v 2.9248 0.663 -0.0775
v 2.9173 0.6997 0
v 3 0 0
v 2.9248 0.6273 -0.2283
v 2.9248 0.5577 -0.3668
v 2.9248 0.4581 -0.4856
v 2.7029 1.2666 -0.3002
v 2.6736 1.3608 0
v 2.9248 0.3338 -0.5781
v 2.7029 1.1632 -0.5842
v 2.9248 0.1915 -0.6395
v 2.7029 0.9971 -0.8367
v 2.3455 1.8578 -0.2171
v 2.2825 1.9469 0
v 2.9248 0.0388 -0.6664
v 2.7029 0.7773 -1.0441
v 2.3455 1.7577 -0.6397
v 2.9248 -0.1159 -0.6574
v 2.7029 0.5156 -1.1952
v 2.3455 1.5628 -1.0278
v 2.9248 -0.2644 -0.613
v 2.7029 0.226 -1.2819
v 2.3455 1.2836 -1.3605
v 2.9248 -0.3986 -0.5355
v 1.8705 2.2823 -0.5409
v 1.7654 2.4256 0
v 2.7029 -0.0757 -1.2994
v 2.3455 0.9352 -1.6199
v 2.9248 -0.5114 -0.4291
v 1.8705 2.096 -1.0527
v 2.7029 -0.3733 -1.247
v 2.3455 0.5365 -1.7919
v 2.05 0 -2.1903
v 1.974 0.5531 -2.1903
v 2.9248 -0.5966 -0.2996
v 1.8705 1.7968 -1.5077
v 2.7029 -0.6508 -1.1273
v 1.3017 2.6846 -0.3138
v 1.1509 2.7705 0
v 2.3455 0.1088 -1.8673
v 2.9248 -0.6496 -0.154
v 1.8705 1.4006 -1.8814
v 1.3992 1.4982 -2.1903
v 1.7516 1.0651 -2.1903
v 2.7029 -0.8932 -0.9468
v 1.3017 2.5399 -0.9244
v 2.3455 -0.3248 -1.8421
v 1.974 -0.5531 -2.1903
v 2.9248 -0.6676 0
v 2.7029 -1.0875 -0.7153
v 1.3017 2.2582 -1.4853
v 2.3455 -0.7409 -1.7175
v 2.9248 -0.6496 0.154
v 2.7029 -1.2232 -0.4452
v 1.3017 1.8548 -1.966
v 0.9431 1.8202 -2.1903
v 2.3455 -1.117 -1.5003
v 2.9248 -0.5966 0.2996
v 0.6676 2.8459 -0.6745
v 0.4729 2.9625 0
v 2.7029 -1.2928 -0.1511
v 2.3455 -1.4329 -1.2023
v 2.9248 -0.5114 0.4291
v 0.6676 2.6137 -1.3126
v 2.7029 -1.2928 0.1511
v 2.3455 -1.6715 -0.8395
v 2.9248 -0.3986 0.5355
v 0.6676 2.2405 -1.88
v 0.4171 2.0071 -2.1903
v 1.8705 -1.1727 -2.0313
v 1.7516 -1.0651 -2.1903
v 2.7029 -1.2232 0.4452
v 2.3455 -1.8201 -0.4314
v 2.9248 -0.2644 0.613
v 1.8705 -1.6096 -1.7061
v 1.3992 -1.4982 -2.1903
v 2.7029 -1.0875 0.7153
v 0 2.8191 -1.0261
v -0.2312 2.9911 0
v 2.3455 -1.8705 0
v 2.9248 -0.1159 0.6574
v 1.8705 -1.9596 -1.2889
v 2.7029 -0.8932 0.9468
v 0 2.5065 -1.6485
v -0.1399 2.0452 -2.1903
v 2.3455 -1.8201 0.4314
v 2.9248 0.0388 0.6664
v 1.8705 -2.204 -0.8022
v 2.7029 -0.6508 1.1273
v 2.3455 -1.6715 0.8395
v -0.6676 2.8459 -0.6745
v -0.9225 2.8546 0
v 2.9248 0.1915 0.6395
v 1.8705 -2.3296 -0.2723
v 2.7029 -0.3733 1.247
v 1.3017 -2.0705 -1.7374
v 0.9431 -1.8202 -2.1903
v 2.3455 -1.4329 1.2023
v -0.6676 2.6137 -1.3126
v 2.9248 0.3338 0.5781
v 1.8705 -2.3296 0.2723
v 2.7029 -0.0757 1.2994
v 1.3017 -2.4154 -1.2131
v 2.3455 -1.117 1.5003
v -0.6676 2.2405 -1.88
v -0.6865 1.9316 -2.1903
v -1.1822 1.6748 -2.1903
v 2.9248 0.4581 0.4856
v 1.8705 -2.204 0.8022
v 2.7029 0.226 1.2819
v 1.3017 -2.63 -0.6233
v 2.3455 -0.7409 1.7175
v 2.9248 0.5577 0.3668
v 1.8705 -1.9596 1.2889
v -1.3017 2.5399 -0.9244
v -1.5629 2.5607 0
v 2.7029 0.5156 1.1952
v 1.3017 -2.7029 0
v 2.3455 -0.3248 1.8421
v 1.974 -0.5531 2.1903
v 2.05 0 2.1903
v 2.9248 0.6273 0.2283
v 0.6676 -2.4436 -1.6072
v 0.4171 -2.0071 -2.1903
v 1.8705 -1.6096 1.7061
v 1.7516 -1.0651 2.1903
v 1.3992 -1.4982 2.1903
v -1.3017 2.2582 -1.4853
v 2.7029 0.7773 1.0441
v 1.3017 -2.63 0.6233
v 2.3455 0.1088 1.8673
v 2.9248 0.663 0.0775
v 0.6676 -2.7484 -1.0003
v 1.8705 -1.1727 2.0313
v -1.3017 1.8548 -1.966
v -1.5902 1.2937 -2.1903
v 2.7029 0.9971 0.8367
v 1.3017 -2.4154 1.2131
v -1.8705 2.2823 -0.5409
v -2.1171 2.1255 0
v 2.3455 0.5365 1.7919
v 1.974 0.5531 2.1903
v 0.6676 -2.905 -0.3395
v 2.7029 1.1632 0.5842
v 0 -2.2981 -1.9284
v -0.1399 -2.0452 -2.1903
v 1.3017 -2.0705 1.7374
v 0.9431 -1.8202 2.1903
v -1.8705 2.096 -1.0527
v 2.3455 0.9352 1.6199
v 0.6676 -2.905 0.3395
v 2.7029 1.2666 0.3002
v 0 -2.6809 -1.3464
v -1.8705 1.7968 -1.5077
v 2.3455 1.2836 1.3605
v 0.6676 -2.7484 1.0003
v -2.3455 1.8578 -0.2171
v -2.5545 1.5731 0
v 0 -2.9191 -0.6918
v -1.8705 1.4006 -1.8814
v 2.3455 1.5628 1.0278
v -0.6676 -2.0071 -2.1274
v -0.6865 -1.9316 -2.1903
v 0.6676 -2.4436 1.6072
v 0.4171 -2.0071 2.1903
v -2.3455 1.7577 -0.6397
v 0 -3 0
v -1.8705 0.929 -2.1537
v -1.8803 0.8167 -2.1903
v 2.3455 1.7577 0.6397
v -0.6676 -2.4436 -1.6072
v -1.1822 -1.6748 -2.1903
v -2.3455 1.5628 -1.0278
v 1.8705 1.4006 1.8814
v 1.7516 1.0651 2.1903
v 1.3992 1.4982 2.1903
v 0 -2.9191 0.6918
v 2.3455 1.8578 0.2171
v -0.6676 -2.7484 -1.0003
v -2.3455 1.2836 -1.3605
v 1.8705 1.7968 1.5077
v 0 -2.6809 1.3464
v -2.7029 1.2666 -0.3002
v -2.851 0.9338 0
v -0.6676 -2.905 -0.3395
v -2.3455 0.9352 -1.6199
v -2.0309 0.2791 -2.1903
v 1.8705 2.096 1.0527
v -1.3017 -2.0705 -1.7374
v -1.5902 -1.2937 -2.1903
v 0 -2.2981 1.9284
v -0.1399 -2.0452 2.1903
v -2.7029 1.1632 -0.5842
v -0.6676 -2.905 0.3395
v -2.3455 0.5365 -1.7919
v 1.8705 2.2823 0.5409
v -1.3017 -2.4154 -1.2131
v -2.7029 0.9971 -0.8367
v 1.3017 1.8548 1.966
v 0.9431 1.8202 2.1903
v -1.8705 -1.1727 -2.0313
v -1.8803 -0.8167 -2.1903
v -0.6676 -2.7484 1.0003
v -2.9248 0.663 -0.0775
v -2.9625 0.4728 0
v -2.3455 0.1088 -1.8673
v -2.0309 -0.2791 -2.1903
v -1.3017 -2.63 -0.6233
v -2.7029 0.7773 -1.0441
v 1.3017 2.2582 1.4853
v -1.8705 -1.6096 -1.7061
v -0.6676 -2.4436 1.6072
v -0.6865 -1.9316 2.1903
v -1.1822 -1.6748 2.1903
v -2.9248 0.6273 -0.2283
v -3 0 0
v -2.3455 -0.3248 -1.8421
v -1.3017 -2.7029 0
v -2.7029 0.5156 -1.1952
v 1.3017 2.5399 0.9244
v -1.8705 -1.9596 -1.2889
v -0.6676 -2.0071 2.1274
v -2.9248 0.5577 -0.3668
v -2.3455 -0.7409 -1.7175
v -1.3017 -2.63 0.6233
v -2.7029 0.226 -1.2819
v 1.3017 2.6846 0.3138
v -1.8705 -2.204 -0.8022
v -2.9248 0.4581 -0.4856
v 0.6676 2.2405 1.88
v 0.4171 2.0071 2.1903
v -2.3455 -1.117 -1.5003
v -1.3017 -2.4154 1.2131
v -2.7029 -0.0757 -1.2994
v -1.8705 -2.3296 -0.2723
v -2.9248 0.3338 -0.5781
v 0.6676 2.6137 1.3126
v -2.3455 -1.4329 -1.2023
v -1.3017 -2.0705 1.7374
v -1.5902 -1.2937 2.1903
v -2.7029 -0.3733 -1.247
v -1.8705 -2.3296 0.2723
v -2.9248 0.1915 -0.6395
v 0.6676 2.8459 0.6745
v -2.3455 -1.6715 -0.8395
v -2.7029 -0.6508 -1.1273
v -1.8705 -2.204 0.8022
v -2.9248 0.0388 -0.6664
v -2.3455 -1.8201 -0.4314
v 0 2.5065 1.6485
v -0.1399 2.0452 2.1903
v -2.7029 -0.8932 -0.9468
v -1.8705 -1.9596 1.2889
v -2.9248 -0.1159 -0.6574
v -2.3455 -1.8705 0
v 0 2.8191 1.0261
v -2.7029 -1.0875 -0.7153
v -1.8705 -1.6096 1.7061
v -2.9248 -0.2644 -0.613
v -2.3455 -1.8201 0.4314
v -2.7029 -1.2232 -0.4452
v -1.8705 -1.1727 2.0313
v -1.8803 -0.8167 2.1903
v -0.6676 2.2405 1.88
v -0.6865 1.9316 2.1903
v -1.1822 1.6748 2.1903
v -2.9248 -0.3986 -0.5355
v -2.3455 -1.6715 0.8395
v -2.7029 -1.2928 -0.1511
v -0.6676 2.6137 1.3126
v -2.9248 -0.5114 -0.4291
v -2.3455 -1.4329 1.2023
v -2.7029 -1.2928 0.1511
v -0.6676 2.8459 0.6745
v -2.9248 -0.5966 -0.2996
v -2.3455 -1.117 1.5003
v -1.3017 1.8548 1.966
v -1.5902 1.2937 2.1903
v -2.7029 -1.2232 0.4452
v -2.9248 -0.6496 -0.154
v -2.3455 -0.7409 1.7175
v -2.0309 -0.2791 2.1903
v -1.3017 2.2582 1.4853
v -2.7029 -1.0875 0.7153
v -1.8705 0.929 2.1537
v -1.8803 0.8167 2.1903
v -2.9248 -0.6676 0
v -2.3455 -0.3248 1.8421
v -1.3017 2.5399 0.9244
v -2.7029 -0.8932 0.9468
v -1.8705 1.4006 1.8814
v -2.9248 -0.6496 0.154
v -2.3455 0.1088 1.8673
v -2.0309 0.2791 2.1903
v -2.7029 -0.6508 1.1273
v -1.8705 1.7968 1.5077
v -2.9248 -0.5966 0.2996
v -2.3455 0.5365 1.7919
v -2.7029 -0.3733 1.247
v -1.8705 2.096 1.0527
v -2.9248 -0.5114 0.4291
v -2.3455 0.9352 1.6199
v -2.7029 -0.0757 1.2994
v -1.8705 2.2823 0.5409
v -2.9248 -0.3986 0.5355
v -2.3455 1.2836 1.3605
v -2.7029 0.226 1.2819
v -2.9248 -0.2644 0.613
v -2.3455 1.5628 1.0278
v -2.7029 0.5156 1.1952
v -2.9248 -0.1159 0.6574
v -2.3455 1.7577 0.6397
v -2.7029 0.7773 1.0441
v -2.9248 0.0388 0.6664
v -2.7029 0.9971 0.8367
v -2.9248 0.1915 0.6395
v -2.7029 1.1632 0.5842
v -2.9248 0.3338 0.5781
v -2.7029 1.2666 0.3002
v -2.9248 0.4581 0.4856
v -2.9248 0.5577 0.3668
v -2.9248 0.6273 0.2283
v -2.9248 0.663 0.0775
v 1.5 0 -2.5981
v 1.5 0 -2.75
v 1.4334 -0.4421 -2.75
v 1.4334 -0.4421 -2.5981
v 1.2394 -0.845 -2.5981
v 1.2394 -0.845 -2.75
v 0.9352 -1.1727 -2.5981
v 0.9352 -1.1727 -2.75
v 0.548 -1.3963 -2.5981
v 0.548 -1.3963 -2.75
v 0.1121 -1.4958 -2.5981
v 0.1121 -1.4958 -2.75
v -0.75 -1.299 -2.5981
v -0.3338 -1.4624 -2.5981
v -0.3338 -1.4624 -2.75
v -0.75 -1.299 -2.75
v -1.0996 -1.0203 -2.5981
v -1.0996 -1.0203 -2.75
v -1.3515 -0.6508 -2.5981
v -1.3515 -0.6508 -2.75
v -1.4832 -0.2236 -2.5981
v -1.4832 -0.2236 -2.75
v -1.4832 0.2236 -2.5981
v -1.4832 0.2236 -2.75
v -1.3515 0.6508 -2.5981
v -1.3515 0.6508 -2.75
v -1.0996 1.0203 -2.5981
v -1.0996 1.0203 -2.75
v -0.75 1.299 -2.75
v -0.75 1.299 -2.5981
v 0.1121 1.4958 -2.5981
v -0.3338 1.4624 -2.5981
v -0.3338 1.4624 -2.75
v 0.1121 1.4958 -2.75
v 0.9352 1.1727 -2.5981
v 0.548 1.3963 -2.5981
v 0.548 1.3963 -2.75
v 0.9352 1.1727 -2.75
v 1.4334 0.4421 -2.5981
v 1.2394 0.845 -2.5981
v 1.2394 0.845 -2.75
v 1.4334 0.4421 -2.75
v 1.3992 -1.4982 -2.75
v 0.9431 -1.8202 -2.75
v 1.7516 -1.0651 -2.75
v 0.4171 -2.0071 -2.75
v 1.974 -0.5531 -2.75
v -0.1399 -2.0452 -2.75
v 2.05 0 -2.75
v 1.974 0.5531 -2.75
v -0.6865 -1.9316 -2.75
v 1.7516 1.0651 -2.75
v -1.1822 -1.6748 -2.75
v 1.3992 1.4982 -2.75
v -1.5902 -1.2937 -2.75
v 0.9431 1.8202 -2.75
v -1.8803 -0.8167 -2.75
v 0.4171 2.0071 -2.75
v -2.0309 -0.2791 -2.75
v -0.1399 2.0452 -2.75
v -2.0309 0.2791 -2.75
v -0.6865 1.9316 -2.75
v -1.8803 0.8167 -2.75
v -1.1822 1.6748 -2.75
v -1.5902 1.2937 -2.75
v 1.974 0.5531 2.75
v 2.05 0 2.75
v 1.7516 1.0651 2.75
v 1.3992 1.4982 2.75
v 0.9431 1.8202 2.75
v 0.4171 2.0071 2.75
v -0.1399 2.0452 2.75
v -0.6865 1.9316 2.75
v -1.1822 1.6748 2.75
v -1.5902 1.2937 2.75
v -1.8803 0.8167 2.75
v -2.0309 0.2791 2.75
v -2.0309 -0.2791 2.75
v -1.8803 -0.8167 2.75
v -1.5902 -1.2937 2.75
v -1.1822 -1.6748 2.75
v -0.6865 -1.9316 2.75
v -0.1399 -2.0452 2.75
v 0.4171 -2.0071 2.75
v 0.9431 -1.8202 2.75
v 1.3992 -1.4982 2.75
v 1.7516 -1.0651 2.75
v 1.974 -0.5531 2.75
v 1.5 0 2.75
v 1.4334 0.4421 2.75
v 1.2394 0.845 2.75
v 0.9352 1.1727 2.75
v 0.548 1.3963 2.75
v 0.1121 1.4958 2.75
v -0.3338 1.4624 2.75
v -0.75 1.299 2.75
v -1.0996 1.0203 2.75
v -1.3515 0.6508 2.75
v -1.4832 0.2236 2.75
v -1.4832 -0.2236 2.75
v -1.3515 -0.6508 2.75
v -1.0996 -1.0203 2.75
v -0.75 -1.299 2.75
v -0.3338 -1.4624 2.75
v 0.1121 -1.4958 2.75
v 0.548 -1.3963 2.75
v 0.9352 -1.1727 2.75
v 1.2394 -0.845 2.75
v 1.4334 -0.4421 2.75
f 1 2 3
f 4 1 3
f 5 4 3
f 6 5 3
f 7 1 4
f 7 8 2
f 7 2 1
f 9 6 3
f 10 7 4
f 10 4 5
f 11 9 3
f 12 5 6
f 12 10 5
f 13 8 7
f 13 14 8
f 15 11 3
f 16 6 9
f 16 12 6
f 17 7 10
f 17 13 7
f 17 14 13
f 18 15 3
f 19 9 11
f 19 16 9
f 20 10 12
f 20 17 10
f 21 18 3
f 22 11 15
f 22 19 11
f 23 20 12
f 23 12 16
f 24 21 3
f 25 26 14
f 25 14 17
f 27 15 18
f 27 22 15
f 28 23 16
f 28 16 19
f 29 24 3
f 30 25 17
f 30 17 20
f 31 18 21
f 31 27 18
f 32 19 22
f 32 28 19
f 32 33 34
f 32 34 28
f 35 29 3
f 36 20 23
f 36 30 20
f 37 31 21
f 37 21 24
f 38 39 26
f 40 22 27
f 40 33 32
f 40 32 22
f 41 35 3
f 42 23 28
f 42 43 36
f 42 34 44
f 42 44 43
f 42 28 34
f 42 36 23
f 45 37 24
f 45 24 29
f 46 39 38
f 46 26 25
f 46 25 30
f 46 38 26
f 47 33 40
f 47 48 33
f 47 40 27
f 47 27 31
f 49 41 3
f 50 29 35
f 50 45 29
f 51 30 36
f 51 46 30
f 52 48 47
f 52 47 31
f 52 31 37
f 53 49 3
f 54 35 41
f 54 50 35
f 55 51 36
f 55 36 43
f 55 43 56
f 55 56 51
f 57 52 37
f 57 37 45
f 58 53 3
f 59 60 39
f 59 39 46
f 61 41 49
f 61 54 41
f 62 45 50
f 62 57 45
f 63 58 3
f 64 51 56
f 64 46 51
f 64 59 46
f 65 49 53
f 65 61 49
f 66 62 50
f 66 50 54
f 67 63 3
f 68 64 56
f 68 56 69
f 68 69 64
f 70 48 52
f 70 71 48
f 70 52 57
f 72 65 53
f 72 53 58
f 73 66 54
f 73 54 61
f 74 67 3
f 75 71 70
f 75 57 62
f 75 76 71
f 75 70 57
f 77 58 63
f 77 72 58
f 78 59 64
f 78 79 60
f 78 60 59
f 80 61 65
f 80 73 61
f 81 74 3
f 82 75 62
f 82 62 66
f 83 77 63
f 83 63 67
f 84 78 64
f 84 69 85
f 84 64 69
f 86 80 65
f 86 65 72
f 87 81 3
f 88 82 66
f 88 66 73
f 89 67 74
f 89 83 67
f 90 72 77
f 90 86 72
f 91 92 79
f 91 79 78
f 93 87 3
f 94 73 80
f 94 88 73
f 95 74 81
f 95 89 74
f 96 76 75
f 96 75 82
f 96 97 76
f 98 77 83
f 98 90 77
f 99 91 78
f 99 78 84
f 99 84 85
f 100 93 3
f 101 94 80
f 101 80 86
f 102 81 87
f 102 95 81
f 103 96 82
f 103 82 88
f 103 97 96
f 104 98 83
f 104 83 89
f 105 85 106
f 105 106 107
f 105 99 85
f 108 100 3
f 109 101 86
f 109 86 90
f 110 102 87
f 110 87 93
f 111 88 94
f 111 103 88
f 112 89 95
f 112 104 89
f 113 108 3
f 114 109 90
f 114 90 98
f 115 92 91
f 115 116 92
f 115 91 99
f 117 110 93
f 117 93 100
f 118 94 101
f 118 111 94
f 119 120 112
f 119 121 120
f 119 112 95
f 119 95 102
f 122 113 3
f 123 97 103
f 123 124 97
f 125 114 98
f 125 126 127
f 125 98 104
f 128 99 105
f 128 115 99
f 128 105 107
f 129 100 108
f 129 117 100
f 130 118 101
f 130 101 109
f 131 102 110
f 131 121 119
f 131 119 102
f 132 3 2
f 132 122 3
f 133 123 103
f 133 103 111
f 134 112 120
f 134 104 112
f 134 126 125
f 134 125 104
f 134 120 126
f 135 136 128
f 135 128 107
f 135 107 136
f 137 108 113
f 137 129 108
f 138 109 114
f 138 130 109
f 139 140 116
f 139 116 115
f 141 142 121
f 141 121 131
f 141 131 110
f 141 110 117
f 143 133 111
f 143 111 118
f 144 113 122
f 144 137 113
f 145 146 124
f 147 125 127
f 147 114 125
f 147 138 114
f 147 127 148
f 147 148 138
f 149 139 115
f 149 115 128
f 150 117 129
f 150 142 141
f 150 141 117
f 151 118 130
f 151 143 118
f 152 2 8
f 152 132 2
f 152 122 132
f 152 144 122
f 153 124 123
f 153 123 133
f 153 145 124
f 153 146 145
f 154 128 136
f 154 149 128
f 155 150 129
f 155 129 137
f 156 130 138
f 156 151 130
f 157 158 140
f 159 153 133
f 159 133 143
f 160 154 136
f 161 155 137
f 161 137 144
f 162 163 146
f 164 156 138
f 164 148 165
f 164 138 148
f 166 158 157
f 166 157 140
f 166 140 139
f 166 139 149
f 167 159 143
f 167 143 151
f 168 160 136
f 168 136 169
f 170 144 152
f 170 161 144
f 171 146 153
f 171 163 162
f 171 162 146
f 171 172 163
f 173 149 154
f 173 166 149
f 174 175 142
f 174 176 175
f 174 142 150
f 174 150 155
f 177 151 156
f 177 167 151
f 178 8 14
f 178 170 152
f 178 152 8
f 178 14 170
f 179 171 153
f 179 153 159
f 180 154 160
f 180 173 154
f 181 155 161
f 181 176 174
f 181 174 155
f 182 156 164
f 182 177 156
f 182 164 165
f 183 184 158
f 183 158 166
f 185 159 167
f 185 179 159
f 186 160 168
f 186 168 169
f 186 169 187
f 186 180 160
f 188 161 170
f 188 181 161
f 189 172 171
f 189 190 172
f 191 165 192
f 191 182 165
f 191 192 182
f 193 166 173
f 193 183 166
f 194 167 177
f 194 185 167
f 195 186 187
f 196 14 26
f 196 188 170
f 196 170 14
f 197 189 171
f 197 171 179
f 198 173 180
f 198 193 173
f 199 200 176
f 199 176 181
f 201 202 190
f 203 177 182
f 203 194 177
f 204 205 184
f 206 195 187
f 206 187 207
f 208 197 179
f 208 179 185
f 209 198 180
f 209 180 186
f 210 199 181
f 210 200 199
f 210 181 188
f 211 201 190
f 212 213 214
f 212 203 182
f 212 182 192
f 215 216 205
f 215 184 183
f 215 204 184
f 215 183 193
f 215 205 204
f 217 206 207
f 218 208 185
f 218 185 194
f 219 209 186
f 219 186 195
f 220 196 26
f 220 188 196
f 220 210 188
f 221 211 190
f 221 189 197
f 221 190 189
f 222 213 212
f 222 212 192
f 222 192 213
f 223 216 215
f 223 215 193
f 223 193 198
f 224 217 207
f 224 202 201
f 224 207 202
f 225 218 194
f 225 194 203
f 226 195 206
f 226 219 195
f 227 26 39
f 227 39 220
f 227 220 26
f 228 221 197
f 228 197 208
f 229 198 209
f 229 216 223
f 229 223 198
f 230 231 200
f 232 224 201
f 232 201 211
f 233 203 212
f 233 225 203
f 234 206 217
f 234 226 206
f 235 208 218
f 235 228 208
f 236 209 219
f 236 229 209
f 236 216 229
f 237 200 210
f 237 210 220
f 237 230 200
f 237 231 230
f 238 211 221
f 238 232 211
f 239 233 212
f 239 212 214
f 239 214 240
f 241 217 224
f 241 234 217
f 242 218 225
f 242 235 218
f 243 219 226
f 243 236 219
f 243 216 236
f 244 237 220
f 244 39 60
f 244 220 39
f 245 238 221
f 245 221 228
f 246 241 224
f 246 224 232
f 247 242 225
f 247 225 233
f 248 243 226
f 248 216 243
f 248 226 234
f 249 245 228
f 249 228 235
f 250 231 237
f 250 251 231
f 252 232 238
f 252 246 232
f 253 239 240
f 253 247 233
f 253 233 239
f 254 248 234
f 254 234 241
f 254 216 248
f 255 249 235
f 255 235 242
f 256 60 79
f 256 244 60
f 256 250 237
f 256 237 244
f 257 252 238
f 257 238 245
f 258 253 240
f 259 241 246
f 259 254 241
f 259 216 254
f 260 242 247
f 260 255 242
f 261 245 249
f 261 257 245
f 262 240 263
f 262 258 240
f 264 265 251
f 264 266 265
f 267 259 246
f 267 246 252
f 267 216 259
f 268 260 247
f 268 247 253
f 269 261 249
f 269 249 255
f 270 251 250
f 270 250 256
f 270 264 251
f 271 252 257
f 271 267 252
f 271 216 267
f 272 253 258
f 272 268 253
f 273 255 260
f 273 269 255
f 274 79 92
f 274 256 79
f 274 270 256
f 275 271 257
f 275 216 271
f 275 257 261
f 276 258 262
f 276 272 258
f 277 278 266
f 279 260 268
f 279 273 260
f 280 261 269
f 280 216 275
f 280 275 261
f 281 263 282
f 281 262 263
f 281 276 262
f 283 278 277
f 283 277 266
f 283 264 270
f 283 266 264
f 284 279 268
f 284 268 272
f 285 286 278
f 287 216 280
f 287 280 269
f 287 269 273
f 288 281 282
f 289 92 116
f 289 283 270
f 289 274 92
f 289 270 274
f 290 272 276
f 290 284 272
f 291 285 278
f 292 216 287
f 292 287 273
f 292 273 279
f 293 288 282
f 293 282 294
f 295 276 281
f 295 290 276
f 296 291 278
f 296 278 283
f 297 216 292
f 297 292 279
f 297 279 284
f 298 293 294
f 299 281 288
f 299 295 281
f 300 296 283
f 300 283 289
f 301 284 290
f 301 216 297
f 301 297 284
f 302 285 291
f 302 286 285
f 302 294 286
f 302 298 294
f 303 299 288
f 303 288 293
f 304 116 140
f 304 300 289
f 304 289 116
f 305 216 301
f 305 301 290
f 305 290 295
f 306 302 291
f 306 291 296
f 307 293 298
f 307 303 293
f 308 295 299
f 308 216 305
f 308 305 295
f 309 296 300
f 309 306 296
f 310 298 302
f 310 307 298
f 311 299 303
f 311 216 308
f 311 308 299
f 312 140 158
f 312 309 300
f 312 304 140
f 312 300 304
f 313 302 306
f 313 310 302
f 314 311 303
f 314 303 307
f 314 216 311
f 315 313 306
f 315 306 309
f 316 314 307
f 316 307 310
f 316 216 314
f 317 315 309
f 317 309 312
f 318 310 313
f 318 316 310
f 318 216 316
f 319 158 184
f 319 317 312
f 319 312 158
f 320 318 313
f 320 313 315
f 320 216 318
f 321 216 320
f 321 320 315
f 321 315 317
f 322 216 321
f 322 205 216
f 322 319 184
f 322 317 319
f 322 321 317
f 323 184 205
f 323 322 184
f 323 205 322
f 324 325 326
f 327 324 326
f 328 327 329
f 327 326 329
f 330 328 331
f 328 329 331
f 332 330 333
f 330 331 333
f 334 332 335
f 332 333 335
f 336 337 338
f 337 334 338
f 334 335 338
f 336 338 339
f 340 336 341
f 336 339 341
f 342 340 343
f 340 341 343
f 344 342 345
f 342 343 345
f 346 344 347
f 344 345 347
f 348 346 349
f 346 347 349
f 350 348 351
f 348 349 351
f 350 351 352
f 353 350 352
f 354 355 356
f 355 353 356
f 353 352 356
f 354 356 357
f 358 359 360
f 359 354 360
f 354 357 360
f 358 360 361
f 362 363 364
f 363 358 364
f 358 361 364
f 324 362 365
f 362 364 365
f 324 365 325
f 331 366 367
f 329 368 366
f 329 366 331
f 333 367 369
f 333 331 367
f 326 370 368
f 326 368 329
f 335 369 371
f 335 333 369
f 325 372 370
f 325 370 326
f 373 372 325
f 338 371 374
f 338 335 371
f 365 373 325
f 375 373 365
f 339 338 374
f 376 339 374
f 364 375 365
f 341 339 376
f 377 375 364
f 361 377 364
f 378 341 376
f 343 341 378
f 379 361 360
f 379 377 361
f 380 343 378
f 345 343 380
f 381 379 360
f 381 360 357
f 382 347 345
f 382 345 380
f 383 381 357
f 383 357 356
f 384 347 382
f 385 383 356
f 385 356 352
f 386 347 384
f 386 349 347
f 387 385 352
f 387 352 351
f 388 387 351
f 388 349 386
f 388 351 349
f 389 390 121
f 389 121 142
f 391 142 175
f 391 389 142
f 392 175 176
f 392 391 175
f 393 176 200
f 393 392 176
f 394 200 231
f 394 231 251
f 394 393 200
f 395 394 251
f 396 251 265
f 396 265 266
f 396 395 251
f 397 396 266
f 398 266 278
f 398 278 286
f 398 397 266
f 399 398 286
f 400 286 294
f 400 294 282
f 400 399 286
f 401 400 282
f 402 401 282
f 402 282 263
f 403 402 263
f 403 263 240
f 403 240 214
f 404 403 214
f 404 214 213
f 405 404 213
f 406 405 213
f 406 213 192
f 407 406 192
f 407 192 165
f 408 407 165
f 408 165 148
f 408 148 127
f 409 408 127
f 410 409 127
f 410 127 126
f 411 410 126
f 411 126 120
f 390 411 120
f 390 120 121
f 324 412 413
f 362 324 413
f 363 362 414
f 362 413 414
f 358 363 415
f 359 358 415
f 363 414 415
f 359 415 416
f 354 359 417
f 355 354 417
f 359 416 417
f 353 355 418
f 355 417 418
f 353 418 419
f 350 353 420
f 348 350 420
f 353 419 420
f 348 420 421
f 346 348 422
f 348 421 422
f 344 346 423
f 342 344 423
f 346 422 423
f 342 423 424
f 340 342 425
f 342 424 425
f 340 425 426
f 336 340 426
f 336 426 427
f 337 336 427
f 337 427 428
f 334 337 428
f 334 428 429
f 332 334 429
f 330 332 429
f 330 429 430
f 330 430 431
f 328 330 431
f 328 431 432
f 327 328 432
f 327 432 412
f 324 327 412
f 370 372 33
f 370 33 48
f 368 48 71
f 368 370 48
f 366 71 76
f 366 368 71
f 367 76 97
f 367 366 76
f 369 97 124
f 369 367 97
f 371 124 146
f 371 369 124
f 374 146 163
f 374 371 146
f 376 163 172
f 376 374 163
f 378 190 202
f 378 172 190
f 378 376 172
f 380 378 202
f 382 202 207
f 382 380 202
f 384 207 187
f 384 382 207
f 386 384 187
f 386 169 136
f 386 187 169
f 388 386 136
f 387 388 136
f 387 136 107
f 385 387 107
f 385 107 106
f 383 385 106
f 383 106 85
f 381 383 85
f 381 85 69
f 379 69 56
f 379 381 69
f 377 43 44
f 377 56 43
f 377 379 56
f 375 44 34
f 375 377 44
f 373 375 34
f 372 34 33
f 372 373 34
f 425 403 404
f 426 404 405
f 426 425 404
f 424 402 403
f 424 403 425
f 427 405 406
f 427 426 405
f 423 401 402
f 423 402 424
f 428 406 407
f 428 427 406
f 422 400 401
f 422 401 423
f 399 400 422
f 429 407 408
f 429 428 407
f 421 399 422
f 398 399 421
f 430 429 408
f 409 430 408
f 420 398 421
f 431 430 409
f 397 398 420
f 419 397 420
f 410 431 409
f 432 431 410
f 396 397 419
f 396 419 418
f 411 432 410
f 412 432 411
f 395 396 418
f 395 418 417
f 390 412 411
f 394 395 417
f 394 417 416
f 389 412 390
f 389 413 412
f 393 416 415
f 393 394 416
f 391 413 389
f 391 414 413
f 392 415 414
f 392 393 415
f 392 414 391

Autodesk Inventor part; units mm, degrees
ref_plane "YZ Plane" through (0, 0, 0) normal (1, 0, 0) x (0, 1, 0)
ref_plane "XZ Plane" through (0, 0, 0) normal (0, 1, 0) x (-1, 0, 0)
sketch "Sketch2" plane through (0, 0, 0) normal (0, 0, 1) x (1, 0, 0)
  line L0 (-4.2, 0) -> (4.2, 0) construction
  line L1 (0, -4.2) -> (0, 4.2) construction
  circle A0 centre (0, 0) radius 3
  line L2 (-3, 0) -> (3, 0)
  dimension "d0" = 6
revolve "Revolution1" add sketch "Sketch2" angle 360 about axis through (-10, 0, 0) along (1, 0, 0) picked at (0.7485, 0.6631) contours L2 A0
sketch "Sketch3" plane through (0, 0, 0) normal (0, 0, 1) x (1, 0, 0)
  circle A0 centre (0, 0) radius 1.5
  dimension "d2" = 3
extrude "Extrusion1" cut sketch "Sketch3" along normal through all both and the other way through all
ref_plane "Work Plane1" through (0, 0, 2.75) normal (0, 0, 1) x (1, 0, 0)
sketch "Sketch4" plane through (0, 0, 2.75) normal (0, 0, 1) x (1, 0, 0)
  circle A0 centre (0, 0) radius 1.5 construction
  circle A1 centre (0, 0) radius 1.5
  circle A2 centre (0, 0) radius 2.05
  dimension "d6" = 4.1
extrude "Extrusion2" add sketch "Sketch4" against normal up to surface
mirror "Mirror1" about plane through (0, 0, 0) normal (0, 0, 1) of "Extrusion2"
properties part number "Boule_tete_verin" material "Copper, Alloy"
